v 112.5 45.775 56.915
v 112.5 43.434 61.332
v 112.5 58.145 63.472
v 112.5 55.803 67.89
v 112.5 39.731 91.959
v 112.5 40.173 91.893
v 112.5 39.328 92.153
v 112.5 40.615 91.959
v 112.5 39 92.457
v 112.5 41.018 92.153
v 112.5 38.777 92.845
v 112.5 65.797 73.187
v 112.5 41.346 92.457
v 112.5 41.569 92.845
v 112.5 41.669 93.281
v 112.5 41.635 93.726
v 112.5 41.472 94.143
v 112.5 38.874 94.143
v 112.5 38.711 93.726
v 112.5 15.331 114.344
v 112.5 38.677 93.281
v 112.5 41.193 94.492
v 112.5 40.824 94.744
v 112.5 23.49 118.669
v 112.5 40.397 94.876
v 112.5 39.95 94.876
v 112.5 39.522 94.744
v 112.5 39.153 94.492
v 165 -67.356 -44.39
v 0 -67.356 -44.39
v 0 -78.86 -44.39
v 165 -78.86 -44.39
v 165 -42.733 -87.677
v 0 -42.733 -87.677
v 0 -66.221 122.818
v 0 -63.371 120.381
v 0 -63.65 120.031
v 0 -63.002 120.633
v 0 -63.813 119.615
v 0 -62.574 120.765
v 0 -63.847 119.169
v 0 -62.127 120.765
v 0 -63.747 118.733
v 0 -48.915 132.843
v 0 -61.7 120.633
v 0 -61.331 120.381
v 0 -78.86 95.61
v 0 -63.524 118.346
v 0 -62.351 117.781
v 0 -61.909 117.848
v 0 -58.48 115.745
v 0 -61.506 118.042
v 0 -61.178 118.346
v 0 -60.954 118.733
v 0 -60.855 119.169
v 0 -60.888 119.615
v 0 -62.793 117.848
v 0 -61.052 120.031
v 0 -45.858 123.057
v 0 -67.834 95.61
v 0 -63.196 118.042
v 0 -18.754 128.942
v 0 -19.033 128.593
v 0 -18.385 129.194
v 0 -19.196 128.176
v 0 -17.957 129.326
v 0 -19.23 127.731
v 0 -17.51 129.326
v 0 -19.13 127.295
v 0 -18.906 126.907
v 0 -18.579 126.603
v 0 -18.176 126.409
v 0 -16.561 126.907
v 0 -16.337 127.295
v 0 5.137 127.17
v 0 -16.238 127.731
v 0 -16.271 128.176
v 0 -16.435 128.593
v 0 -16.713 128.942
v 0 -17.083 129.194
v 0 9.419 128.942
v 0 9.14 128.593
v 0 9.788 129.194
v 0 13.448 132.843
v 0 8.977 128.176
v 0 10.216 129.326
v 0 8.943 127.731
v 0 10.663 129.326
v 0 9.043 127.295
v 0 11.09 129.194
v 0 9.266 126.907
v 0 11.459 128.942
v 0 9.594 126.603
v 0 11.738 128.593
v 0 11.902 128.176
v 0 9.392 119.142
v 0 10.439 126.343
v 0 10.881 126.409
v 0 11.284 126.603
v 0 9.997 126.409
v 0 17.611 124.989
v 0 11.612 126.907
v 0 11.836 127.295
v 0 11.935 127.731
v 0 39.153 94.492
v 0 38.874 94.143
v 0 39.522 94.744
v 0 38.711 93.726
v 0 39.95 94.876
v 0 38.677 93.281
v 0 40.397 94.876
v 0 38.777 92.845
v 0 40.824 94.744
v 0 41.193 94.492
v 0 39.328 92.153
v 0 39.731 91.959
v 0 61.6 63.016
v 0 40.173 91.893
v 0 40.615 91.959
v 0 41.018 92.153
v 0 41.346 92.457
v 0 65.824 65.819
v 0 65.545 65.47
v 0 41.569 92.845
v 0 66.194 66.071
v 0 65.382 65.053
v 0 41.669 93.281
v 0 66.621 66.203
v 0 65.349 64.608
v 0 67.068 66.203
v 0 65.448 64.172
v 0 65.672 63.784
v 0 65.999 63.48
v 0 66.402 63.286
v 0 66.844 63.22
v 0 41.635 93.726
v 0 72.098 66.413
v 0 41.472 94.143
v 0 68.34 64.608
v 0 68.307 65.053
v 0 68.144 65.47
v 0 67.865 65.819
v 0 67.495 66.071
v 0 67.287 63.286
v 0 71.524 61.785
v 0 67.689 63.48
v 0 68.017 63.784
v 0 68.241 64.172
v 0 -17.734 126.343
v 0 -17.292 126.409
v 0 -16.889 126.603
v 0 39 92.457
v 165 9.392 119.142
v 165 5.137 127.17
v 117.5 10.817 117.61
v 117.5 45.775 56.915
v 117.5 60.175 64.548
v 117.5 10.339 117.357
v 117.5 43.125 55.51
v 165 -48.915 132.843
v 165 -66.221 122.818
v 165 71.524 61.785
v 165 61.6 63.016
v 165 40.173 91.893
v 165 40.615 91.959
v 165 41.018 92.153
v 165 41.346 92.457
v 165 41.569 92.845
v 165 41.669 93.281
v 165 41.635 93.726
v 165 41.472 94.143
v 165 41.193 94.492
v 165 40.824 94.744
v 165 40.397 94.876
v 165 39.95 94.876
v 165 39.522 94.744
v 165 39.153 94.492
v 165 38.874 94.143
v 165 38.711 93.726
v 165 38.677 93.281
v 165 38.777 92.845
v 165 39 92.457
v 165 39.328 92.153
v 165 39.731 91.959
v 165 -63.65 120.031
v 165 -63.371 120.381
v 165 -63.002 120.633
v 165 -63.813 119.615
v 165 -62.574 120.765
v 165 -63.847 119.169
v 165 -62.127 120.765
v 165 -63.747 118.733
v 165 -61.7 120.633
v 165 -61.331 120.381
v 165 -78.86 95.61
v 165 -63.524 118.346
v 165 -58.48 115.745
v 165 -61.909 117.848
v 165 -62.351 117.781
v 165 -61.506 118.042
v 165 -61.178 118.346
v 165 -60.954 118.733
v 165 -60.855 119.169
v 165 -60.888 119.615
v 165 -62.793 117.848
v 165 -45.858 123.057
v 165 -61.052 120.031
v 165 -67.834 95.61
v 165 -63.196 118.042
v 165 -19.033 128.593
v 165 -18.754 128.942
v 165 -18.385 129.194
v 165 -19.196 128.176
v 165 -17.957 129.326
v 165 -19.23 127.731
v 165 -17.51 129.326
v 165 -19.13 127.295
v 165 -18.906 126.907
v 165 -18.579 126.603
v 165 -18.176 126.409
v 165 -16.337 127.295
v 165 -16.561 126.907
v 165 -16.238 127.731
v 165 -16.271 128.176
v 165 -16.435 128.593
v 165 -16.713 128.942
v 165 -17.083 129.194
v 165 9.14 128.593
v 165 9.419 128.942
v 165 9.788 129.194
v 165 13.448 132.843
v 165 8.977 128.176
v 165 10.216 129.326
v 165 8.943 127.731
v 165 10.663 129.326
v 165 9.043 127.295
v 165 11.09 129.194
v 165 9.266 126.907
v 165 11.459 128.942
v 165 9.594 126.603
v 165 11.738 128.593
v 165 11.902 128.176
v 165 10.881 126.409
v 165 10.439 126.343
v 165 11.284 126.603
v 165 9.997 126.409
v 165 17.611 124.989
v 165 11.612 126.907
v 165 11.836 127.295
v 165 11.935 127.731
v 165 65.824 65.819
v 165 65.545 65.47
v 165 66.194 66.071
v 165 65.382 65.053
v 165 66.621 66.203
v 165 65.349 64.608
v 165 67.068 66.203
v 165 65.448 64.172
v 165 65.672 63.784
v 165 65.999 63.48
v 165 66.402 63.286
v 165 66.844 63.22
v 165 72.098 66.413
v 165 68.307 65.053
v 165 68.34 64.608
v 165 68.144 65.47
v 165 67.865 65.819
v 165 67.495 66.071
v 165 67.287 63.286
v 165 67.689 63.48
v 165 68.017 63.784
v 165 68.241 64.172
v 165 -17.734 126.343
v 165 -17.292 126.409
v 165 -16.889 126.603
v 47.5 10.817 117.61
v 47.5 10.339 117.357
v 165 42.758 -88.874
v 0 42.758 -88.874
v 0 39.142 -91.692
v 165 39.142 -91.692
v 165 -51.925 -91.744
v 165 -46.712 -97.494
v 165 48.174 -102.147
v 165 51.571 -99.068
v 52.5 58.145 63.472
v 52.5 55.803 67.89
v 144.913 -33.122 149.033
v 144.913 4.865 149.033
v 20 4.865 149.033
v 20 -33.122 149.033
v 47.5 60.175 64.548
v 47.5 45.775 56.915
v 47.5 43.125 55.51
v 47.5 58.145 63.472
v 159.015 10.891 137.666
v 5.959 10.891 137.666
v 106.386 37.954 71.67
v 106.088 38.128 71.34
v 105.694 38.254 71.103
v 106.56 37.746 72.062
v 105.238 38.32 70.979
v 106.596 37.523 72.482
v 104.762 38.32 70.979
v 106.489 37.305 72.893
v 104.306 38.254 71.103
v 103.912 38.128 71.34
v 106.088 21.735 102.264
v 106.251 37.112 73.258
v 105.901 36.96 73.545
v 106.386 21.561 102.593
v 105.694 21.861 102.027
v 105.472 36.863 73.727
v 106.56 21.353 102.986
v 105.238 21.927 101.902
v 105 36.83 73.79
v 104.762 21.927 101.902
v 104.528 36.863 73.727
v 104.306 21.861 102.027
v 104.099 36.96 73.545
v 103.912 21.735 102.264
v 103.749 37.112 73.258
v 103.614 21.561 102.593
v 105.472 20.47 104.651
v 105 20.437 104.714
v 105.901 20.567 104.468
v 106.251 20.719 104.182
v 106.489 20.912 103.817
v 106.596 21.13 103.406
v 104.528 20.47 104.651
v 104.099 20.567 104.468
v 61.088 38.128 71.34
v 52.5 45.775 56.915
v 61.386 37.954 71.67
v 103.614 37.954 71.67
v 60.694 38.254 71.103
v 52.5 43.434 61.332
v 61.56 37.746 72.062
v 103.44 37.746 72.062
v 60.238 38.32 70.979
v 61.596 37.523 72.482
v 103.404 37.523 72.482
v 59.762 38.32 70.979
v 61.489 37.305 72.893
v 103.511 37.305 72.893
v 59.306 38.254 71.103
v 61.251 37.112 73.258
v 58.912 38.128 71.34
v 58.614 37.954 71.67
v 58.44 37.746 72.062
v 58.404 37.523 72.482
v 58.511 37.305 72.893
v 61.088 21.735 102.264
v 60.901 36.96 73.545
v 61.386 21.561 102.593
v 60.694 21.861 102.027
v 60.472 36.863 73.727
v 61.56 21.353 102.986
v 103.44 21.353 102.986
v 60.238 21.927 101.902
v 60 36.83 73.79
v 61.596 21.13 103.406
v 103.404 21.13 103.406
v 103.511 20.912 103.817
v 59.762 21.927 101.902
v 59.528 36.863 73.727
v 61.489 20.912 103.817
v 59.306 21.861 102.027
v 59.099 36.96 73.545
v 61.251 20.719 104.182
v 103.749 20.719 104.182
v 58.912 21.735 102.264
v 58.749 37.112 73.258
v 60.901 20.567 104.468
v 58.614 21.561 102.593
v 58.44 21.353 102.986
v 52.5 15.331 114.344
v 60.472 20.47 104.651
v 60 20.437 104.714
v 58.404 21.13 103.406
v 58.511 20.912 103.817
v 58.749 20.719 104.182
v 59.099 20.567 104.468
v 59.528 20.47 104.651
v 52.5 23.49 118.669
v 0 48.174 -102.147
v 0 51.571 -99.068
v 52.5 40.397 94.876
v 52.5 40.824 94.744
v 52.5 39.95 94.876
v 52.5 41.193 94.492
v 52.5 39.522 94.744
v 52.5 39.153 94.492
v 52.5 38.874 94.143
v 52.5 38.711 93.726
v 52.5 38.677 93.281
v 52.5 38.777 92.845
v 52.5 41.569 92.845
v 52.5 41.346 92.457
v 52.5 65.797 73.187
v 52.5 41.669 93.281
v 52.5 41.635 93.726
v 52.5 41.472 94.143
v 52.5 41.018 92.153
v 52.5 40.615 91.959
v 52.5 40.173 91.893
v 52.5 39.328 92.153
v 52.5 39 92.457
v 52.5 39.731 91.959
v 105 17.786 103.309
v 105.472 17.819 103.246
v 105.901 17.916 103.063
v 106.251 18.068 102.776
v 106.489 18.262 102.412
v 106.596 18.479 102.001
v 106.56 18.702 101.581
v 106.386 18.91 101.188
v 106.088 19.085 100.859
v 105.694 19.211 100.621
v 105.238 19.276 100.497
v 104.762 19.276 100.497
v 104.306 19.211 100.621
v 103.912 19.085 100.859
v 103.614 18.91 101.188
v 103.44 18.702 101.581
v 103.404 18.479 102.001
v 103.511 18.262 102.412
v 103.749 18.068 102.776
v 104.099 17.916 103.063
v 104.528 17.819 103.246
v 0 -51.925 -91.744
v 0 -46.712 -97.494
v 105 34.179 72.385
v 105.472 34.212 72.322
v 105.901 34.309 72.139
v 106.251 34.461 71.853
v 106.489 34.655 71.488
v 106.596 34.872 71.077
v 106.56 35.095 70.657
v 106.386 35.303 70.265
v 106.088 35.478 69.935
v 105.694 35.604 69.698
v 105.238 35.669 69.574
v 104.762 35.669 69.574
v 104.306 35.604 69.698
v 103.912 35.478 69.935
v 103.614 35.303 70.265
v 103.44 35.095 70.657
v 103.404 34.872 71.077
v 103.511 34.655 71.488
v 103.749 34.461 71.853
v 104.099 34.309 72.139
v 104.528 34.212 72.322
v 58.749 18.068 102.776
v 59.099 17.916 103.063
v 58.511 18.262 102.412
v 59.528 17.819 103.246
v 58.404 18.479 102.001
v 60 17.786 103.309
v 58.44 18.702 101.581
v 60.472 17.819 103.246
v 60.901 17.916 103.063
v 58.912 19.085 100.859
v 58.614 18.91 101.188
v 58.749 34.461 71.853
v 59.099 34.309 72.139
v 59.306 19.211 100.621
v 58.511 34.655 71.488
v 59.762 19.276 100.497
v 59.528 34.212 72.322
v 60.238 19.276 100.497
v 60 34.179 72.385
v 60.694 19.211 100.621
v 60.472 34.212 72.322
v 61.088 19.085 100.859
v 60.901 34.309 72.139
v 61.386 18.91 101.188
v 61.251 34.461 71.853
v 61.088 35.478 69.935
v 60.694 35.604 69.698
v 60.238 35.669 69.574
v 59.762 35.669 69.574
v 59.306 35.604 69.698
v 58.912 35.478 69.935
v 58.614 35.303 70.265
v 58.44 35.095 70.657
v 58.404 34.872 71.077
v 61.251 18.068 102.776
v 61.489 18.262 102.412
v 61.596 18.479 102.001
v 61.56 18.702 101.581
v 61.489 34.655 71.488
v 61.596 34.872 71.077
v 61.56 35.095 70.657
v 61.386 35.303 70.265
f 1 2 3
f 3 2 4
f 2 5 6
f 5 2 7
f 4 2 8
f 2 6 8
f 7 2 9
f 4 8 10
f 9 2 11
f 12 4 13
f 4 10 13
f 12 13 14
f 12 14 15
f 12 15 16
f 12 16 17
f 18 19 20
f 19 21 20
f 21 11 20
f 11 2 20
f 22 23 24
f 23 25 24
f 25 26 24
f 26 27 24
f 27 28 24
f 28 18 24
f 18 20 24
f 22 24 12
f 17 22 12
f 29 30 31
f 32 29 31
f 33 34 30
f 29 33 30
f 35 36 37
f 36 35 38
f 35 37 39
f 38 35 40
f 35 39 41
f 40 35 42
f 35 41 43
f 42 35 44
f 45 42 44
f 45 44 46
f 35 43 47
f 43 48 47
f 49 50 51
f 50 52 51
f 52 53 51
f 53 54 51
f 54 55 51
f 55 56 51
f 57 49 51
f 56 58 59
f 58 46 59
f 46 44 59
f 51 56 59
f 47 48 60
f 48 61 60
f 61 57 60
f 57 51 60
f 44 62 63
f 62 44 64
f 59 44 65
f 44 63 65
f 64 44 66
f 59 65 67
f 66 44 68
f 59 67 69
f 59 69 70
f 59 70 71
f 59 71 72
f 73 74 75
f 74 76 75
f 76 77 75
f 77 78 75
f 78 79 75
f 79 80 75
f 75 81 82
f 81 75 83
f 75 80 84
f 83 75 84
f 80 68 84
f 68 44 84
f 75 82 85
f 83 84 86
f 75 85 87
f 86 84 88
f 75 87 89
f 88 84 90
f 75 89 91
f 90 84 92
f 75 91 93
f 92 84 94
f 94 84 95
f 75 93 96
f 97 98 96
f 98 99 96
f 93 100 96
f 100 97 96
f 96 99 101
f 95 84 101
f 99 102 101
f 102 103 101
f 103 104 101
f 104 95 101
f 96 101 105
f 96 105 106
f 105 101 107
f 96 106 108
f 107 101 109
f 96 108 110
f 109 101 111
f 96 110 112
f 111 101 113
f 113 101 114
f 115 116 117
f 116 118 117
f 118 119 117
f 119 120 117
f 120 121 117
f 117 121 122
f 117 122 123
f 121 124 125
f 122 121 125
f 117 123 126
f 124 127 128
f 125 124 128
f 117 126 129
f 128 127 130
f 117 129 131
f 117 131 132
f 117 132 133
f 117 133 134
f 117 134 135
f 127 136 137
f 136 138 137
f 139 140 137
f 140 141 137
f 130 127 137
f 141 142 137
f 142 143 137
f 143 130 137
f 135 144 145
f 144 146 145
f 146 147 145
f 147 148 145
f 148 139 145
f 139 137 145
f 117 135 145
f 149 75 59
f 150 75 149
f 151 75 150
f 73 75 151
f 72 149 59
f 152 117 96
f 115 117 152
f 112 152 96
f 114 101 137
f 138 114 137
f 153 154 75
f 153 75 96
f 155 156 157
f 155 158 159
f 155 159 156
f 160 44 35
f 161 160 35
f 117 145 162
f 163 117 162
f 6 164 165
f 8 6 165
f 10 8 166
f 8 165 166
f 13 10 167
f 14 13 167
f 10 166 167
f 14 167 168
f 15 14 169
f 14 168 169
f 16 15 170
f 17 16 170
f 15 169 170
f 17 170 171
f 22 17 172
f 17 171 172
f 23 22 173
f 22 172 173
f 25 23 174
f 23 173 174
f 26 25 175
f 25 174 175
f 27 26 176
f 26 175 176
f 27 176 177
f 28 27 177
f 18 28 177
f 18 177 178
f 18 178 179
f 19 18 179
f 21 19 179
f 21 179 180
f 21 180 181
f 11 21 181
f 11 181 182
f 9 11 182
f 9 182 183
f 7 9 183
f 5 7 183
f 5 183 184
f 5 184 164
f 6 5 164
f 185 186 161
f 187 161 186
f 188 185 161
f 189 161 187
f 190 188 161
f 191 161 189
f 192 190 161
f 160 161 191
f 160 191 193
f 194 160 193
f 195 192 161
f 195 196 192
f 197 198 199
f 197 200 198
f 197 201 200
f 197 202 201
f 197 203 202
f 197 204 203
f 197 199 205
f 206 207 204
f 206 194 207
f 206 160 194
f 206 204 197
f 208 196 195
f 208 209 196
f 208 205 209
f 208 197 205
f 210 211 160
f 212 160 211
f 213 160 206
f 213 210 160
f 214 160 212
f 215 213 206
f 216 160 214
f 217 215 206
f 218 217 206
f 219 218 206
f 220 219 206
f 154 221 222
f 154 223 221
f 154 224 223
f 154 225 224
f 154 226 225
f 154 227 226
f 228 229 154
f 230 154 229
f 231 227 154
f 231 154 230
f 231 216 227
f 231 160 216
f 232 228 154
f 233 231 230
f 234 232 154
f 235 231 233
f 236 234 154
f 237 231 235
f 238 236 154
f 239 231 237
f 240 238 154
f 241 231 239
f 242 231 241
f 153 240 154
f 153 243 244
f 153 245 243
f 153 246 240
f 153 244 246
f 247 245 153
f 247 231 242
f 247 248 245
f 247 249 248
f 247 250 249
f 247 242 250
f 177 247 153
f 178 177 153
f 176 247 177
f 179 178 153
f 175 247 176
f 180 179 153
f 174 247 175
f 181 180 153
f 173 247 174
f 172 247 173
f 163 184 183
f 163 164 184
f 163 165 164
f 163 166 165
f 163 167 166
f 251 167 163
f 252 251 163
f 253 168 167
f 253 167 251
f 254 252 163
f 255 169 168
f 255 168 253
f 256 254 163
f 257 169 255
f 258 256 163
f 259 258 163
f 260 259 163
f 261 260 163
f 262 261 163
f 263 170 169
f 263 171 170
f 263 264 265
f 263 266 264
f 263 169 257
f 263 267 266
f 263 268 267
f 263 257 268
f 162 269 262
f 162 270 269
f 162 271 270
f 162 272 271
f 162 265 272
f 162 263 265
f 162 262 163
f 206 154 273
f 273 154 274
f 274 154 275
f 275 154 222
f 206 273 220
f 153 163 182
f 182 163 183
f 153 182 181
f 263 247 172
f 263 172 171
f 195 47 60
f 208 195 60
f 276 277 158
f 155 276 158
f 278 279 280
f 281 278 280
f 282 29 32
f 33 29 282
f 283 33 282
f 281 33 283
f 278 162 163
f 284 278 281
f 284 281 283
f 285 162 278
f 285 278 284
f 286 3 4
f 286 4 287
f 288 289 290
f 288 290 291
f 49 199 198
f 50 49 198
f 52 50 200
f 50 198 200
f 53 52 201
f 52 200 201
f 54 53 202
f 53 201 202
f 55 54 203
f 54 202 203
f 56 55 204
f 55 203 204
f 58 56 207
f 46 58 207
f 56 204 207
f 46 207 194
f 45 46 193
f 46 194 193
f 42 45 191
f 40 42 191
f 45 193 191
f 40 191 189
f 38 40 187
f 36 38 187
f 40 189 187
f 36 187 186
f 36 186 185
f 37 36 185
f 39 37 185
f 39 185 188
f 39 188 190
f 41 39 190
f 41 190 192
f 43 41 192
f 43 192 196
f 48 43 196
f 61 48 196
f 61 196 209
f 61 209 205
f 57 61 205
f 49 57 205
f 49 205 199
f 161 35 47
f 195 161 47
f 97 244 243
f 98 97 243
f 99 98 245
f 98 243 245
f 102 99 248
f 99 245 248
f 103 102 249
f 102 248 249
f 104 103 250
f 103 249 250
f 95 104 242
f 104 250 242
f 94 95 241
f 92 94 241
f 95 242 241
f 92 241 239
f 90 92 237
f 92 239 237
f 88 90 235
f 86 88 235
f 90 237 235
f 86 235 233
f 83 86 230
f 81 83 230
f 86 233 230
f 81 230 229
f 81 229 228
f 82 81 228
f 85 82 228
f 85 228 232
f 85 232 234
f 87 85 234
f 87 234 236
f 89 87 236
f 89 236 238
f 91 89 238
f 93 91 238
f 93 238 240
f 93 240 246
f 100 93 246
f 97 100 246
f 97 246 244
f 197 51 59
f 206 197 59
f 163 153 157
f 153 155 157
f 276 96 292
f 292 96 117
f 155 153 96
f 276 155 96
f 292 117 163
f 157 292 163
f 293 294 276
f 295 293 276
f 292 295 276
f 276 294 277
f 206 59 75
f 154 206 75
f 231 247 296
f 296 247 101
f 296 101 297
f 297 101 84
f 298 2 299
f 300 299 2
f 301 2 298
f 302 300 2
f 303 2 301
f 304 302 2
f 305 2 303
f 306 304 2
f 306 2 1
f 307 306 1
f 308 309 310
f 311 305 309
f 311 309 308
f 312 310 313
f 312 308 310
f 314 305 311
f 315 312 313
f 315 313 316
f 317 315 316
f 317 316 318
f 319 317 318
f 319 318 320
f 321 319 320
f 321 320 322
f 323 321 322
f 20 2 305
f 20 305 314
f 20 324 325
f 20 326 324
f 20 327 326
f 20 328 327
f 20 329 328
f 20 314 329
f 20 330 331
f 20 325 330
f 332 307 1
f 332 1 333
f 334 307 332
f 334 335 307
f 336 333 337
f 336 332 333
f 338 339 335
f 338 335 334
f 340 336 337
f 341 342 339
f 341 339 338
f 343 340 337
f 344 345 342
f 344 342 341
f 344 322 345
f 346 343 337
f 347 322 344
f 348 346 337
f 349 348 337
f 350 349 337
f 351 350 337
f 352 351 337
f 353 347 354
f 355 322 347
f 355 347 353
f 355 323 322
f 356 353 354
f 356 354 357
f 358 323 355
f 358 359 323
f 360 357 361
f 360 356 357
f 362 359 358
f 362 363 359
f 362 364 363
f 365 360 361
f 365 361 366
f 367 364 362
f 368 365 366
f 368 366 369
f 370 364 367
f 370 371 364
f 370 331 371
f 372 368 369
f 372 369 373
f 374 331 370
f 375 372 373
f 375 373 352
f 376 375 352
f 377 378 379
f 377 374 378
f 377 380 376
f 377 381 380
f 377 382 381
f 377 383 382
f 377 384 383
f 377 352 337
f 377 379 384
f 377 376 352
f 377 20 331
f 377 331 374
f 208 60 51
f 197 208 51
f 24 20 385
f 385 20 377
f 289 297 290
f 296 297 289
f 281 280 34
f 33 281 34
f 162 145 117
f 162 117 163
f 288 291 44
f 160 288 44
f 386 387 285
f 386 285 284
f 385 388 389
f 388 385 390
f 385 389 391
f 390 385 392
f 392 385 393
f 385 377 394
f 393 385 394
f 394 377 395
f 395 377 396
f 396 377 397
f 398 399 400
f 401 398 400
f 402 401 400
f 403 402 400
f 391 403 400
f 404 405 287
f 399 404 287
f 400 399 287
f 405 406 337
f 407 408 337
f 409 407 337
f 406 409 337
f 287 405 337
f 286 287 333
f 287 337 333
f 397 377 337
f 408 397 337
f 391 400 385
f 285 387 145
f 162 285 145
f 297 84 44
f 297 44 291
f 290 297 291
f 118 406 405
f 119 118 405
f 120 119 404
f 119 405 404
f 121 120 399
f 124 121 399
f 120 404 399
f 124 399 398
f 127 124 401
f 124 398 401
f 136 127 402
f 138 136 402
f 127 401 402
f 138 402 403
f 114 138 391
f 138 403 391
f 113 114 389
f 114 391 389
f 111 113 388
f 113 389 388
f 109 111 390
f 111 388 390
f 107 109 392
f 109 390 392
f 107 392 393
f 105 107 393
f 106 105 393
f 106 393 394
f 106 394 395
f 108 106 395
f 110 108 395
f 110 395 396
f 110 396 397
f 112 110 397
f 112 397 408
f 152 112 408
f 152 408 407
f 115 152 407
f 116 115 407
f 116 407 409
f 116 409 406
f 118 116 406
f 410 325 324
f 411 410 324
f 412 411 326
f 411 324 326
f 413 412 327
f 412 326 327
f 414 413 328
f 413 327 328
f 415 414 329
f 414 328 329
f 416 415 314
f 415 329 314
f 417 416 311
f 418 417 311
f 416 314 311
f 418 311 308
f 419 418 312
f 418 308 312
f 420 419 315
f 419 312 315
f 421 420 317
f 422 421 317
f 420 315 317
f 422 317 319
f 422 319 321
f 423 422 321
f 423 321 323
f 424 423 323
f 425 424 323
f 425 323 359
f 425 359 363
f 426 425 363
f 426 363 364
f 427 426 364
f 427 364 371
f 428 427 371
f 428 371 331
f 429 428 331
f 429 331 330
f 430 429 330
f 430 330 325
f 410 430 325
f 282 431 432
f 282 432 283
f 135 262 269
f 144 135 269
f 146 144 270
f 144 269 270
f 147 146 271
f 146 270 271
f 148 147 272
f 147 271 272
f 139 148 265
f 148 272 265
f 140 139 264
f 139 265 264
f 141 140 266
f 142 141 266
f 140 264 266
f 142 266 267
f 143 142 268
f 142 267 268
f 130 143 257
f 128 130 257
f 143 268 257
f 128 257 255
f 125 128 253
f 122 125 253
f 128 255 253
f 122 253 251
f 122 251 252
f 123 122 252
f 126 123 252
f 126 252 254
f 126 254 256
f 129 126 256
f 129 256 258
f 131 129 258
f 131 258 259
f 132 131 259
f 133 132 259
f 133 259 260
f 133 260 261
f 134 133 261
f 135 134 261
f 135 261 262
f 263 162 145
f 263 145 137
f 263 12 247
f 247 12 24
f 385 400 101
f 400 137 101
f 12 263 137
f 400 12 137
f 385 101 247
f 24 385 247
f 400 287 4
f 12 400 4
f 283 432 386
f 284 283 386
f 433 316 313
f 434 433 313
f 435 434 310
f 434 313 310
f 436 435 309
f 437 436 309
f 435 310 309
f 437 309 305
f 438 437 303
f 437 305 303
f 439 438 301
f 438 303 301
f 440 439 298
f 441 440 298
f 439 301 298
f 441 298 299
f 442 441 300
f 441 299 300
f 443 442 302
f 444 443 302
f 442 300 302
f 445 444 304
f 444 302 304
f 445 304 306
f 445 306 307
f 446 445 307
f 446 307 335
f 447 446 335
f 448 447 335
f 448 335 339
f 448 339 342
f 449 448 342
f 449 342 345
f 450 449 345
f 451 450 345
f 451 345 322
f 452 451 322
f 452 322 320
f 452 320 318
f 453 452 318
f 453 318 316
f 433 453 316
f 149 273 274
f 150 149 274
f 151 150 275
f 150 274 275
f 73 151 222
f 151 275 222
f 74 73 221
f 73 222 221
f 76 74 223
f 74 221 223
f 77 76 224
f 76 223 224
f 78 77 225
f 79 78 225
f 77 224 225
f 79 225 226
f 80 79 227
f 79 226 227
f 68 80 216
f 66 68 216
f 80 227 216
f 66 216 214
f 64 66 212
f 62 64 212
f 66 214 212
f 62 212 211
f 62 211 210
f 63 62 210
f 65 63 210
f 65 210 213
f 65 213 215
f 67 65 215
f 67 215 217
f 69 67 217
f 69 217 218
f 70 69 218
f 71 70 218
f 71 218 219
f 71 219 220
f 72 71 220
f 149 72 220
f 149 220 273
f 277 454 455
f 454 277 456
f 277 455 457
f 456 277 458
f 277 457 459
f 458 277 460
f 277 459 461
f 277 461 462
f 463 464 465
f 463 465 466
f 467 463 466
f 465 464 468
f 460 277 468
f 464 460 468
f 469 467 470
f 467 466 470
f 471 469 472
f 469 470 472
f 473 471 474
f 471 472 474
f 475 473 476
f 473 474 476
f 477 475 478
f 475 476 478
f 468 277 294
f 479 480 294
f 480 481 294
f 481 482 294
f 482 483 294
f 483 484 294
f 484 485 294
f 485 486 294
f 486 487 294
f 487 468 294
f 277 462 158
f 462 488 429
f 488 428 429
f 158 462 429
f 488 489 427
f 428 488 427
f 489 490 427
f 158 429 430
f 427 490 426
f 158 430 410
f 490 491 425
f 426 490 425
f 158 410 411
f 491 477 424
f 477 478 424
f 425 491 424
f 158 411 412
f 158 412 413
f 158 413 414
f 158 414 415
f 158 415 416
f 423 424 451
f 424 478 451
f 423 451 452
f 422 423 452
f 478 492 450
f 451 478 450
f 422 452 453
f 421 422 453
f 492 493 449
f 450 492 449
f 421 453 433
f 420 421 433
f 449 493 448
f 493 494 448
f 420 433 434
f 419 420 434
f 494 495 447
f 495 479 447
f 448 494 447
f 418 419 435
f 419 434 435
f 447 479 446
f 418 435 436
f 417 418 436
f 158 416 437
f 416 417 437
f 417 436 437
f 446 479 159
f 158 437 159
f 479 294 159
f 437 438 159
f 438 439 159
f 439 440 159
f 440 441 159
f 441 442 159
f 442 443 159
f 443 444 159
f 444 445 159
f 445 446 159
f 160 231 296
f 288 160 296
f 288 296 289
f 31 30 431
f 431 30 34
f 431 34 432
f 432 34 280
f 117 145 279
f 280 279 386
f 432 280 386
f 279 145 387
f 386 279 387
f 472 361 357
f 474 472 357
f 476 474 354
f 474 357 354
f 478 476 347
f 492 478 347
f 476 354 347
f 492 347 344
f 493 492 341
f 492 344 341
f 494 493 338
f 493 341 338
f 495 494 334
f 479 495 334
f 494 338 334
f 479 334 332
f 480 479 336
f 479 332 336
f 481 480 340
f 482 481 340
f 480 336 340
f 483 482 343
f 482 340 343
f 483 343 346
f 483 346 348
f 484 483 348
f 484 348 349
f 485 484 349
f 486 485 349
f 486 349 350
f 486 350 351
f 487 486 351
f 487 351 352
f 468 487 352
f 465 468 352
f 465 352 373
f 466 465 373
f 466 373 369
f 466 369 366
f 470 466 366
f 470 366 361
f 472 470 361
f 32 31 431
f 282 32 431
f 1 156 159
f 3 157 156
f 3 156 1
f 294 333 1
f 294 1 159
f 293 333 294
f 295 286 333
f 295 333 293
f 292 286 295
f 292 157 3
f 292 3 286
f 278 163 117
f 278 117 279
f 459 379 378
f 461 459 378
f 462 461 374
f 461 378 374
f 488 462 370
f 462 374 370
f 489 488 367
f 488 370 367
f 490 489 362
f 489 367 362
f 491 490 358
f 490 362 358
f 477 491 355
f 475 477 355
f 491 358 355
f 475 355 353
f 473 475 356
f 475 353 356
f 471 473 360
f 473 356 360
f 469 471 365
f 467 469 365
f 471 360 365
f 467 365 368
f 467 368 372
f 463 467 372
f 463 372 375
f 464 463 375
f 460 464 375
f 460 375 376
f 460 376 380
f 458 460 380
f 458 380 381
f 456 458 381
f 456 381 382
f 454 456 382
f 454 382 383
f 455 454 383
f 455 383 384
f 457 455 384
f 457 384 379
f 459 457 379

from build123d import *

# Parameters (mm, degrees)
EXTRUDE_1_DEPTH          = 165
CHAMFER_START            = -1
CHAMFER_2_DEPTH          = 167
CHAMFER_2_2_DEPTH        = 165
CHAMFER_3_SIZE           = 2
CHAMFER_3_SIZE2          = 6.502897882
EXTRUDE_2_DEPTH          = 165
CUT_EXTRUDE_1_DEPTH      = 129
CUT_EXTRUDE_1_DEPTH_BACK = 90
SKETCH_19_R              = 1.5
CUT_EXTRUDE_4_DEPTH      = 359
EXTRUDE_5_REACH          = 253.104
SKETCH_25_W              = 60
SKETCH_25_H              = 60
CUT_EXTRUDE_6_DEPTH      = 68
EXTRUDE_6_REACH          = 275.755
SKETCH_26_W              = 60
SKETCH_26_H              = 3
SKETCH_27_R              = 1.6
CUT_EXTRUDE_7_DEPTH      = 68
SKETCH_28_W              = 70
SKETCH_28_H              = 14
CUT_EXTRUDE_8_DEPTH      = 5
SKETCH_29_W              = 5
SKETCH_29_H              = 14
EXTRUDE_7_DEPTH          = 5


with BuildPart() as part:
    # 草图1 → 凸台-拉伸1 (new body)
    with BuildSketch(Plane(origin=(0, 0, 0), x_dir=(0, 0, -1), z_dir=(1, 0, 0))):
        Polygon((-119.14227599, 9.392327421), (-63.016495383, 61.600065372), (91.851255652, 42.389083929), (87.677118577, -42.733366558), (44.389827178, -67.355869721), (44.389827178, -78.860441079), (97.396076824, -48.709639137), (102.293876984, 51.170346614), (-66.413062293, 72.098046913), (-124.989193473, 17.611013079), (-137.666400315, 10.890640602), (-132.842708295, -48.915145032), (-122.817695194, -66.221187685), (-95.610172822, -78.860441079), (-95.610172822, -67.834078741), (-115.745111112, -58.48039399), (-123.056782297, -45.858356282), (-127.169844392, 5.136796181), align=None)
    extrude(amount=EXTRUDE_1_DEPTH)

    # 倒角2: read off the stored shape, not the designer's step
    # 倒角2 outline → 倒角2 (cut)
    with BuildSketch(Plane.YZ.offset(CHAMFER_START)):
        Polygon((51.170346614, -102.293876984), (51.570519841, -99.067913343), (48.173947041, -102.146942979), align=None)
    extrude(amount=CHAMFER_2_DEPTH, mode=Mode.SUBTRACT)

    # Chamfer 2 2 outline → Chamfer 2 2 (add)
    with BuildSketch(Plane.YZ):
        Polygon((42.389083929, -91.851255652), (42.758396287, -88.874074371), (39.142296059, -91.692043393), align=None)
    extrude(amount=CHAMFER_2_2_DEPTH)

    # 倒角3
    chamfer_3_edges = [part.edges().sort_by_distance(p)[0] for p in [
        (82.5, -48.709639137, -97.396076824),
    ]]
    chamfer_3_side = [part.faces().sort_by_distance(p)[0] for p in [
        (82.5, -0.267846048, -99.771509901),
    ]]
    chamfer(chamfer_3_edges, length=CHAMFER_3_SIZE, length2=CHAMFER_3_SIZE2, reference=chamfer_3_side[0])

    # 草图12 → 凸台-拉伸2 (add)
    with BuildSketch(Plane(origin=(165, 0, 0), x_dir=(0, 0, -1), z_dir=(1, 0, 0))):
        Polygon((-149.032892218, 4.865097255), (-149.032892218, -33.12186714), (-132.842708295, -48.915145032), (-137.666400315, 10.890640602), align=None)
    extrude(amount=-EXTRUDE_2_DEPTH)

    # 草图13 → 切除-拉伸1 (cut, two sides: drawn at the far end of the back side and taken through both)
    with BuildSketch(Plane.XZ.offset(-4.865097255).offset(-CUT_EXTRUDE_1_DEPTH_BACK)):
        Polygon((0, 149.032892218), (0, 132.842708295), (20, 149.032892218), align=None)
        Polygon((144.913186348, 149.032892218), (165, 149.032892218), (165, 132.842708295), align=None)
    extrude(amount=CUT_EXTRUDE_1_DEPTH + CUT_EXTRUDE_1_DEPTH_BACK, mode=Mode.SUBTRACT)


with BuildPart() as body_2:
    # Split Bodies 1: read off the stored shape, not the designer's step
    # Split Bodies 1: the piece on the far side of the plane
    add(part.part)
    split(bisect_by=Plane(origin=(0, 8.632109926, 69.587046078), x_dir=(1, 0, 0), z_dir=(0, 0.12310411940930002, 0.9923937604522012)), keep=Keep.BOTTOM)


with BuildPart() as part_1:
    add(part.part)

    # Split Bodies 1
    split(bisect_by=Plane(origin=(0, 8.632109926, 69.587046078), x_dir=(1, 0, 0), z_dir=(0, 0.12310411940930002, 0.9923937604522012)), keep=Keep.TOP)

    # 草图19 → 切除-拉伸4 (cut)
    with BuildSketch(Plane(origin=(165, 0, 0), x_dir=(0, 0, -1), z_dir=(1, 0, 0))):
        with Locations((-127.842708295, 10.4392122)):
            Circle(SKETCH_19_R)
        with Locations((-127.842708295, -17.733697424)):
            Circle(SKETCH_19_R)
        with Locations((-119.281403153, -62.350790838)):
            Circle(SKETCH_19_R)
        with Locations((-93.392718519, 40.173073312)):
            Circle(SKETCH_19_R)
        with Locations((-64.719702306, 66.844476373)):
            Circle(SKETCH_19_R)
    extrude(amount=-CUT_EXTRUDE_4_DEPTH, mode=Mode.SUBTRACT)

    # 凸台-拉伸5: up to this plane
    extrude_5_end = Plane(origin=(165, 64.450909172, 59.951703842), z_dir=(0, -0.7322016397474544, -0.6810879229226864))
    # 草图24 → 凸台-拉伸5 (add, up to the surface)
    with BuildSketch(Plane(origin=(0, 56.635574201, 30.023344955), x_dir=(1, 0, 0), z_dir=(0, 0.8835309997249798, 0.4683726855026645)), mode=Mode.PRIVATE) as extrude_5_sk1:
        Polygon((112.5, -50.383912681), (117.5, -48.140229484), (117.5, -28.846011859), (47.5, -28.846011859), (47.5, -79.551794233), (52.5, -77.308111036), (52.5, -33.846011859), (112.5, -33.846011859), align=None)
    extrude_5_tool1 = split(extrude(extrude_5_sk1.sketch, amount=EXTRUDE_5_REACH, mode=Mode.PRIVATE), bisect_by=extrude_5_end, keep=Keep.BOTH, mode=Mode.PRIVATE)
    add(extrude_5_tool1.solids().sort_by_distance((49.646128, 20.270483, 98.621891))[0])
    # 草图24 → 凸台-拉伸5 (add, up to the surface)
    with BuildSketch(Plane(origin=(0, 56.635574201, 30.023344955), x_dir=(1, 0, 0), z_dir=(0, 0.8835309997249798, 0.4683726855026645)), mode=Mode.PRIVATE) as extrude_5_sk2:
        Polygon((117.5, -98.846011859), (117.5, -48.140229484), (112.5, -50.383912681), (112.5, -93.846011859), (52.5, -93.846011859), (52.5, -77.308111036), (47.5, -79.551794233), (47.5, -98.846011859), align=None)
    extrude_5_tool2 = split(extrude(extrude_5_sk2.sketch, amount=EXTRUDE_5_REACH, mode=Mode.PRIVATE), bisect_by=extrude_5_end, keep=Keep.BOTH, mode=Mode.PRIVATE)
    add(extrude_5_tool2.solids().sort_by_distance((48.364354, 14.857244, 108.833341))[0])

    # 草图25 → 切除-拉伸6 (cut)
    with BuildSketch(Plane(origin=(0, 56.635574201, 30.023344955), x_dir=(-1, 0, 0), z_dir=(0, -0.8835309997249798, -0.46837268550266453))):
        with Locations((-82.5, -63.846011859)):
            Rectangle(SKETCH_25_W, SKETCH_25_H)
    extrude(amount=-CUT_EXTRUDE_6_DEPTH, mode=Mode.SUBTRACT)

    # 草图26 → 凸台-拉伸6 (add, up to next)
    with BuildSketch(Plane(origin=(0, -43.954908598, 82.915860678), x_dir=(-1, 0, 0), z_dir=(0, 0.4683726855026646, -0.8835309997249798)), mode=Mode.PRIVATE) as extrude_6_sk1:
        with Locations((-82.5, 65.601400198)):
            Rectangle(SKETCH_26_W, SKETCH_26_H)
    extrude_6_tool1 = extrude(extrude_6_sk1.sketch, amount=EXTRUDE_6_REACH, mode=Mode.PRIVATE) - part_1.part
    add(extrude_6_tool1.solids().sort_by_distance((82.5, 14.005962, 113.641765))[0])

    # 草图27 → 切除-拉伸7 (cut)
    with BuildSketch(Plane(origin=(0, 59.2861672, 31.428463012), x_dir=(1, 0, 0), z_dir=(0, 0.8835309997249797, 0.46837268550266475))):
        with Locations(Location((60, -46.346011859, 0), (0, 0, 270))):
            Circle(SKETCH_27_R)
        with Locations(Location((105, -46.346011859, 0), (0, 0, 270))):
            Circle(SKETCH_27_R)
        with Locations(Location((60, -81.346011859, 0), (0, 0, 270))):
            Circle(SKETCH_27_R)
        with Locations(Location((105, -81.346011859, 0), (0, 0, 270))):
            Circle(SKETCH_27_R)
    extrude(amount=-CUT_EXTRUDE_7_DEPTH, mode=Mode.SUBTRACT)

    # 草图28 → 切除-拉伸8 (cut)
    with BuildSketch(Plane(origin=(0, -13.51068404, 25.486345695), x_dir=(-1, 0, 0), z_dir=(0, 0.4683726855026646, -0.8835309997249798))):
        with Locations((-82.5, 74.101400198)):
            Rectangle(SKETCH_28_W, SKETCH_28_H)
    extrude(amount=-CUT_EXTRUDE_8_DEPTH, mode=Mode.SUBTRACT)

    # 草图29 → 凸台-拉伸7 (add)
    with BuildSketch(Plane(origin=(0, -15.852547468, 29.904000694), x_dir=(-1, 0, 0), z_dir=(0, 0.4683726855026646, -0.8835309997249798))):
        with Locations((-115, 74.101400198)):
            Rectangle(SKETCH_29_W, SKETCH_29_H)
        with Locations((-50, 74.101400198)):
            Rectangle(SKETCH_29_W, SKETCH_29_H)
    extrude(amount=EXTRUDE_7_DEPTH)


solid = Compound([body_2.part, part_1.part])
